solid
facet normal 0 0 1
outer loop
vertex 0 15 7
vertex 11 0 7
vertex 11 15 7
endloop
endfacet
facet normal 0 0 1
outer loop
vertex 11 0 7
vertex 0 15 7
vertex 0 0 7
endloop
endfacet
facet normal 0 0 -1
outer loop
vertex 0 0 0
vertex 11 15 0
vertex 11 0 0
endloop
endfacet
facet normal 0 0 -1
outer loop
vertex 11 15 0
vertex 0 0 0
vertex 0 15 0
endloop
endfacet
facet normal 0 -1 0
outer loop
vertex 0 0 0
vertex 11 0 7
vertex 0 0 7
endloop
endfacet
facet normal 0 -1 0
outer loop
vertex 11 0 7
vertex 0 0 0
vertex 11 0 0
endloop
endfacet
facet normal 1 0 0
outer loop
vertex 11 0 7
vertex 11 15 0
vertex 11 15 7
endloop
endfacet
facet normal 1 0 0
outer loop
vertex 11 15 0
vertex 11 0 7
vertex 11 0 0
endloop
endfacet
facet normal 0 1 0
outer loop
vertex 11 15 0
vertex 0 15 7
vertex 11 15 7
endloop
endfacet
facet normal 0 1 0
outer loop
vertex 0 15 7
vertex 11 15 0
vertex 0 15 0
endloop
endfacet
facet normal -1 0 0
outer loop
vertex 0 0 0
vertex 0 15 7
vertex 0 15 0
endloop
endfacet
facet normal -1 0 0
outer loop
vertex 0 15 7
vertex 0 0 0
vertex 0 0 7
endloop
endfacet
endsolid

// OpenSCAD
// Generated by SolidPython 1.0.1 on 2020-07-29 00:46:55


cube(size = [11, 15, 7]);
/***********************************************
*********      SolidPython code:      **********
************************************************
 
# import packages: SolidPython
from solid import *
from solid.utils import *
from itertools import chain, combinations, permutations


class Resize:

    def __init__(self, scad_file):
        self.scad_file = scad_file
        #self.scad_file = import_scad(scad_file)
        # cone/cylinder param:
        self.r1 = 0
        self.r2 = 0
        self.h = 0
        # rectangular prism param:
        self.w = 0
        self.l = 0
        # ellipse param:
        self.r = 0

    # import OpenScad code (file name corresponds to shape)


    # classify shape + parameters
    def assign(self, param1, param2, param3):
        if self.scad_file == 'cone.scad':
            self.r1 = param1
            self.r2 = param2
            self.h = param3
        elif self.scad_file == 'cylinder.scad':
            self.r1 = param1
            self.r2 = param2
            self.h = param3
        elif self.scad_file == 'rectangularPrism.scad':
            self.h = param1
            self.l = param2
            self.w = param3
        else:
            self.r = param1
            self.h = param2

    # resize parameters
    def iterate(self):
        x = range(3, 20, 2)
        i = 1
        if self.scad_file == 'cone.scad':
            tempList = list(permutations(x, 2))
            for temp in tempList:
                param1 = temp[0]
                param2 = temp[1]
                filepath = 'produced_scad_files/' + 'cone' + str(param1) + '_' + str(param2) + '_' + '.scad'
                scad_render_to_file(cylinder(h=param1, r1=param2, r2=0), filepath)

        elif self.scad_file == 'cylinder.scad':
            tempList = list(permutations(x, 3))
            for temp in tempList:
                param1 = temp[0]
                param2 = temp[1]
                filepath = 'produced_scad_files/' + 'cylinder' + str(param1) + '_' + str(param2) + '_' + '.scad'
                scad_render_to_file(cylinder(h=param1, r1=param2, r2=param2), filepath)

        elif self.scad_file == 'rectangularPrism.scad':
            tempList = list(permutations(x, 3))
            for temp in tempList:
                param1 = temp[0]
                param2 = temp[1]
                param3 = temp[2]
                filepath = 'produced_scad_files/' + 'rectangularPrism' + str(param1) + '_' + str(param2) + '_' + str(
                    param3) + '.scad'
                scad_render_to_file(cube(size=(param1, param2, param3)), filepath)

        elif self.scad_file == 'ellipse.scad':
            tempList = list(permutations(x, 4))
            for temp in tempList:
                param1 = temp[0]
                param2 = temp[1]
                param3 = temp[2]
                param4 = temp[3]
                filepath = 'produced_scad_files/' + 'ellipse' + str(param1) + '_' + str(param2) + '_' + str(param3) + '_' + str(param4) + '.scad'
                scad_render_to_file(scale([param1, param2, param3])(sphere(r=param4)), filepath)

    def render_to_scadfile(self):
        scad_render_to_file(scad, 'example.scad') 
 
************************************************/
